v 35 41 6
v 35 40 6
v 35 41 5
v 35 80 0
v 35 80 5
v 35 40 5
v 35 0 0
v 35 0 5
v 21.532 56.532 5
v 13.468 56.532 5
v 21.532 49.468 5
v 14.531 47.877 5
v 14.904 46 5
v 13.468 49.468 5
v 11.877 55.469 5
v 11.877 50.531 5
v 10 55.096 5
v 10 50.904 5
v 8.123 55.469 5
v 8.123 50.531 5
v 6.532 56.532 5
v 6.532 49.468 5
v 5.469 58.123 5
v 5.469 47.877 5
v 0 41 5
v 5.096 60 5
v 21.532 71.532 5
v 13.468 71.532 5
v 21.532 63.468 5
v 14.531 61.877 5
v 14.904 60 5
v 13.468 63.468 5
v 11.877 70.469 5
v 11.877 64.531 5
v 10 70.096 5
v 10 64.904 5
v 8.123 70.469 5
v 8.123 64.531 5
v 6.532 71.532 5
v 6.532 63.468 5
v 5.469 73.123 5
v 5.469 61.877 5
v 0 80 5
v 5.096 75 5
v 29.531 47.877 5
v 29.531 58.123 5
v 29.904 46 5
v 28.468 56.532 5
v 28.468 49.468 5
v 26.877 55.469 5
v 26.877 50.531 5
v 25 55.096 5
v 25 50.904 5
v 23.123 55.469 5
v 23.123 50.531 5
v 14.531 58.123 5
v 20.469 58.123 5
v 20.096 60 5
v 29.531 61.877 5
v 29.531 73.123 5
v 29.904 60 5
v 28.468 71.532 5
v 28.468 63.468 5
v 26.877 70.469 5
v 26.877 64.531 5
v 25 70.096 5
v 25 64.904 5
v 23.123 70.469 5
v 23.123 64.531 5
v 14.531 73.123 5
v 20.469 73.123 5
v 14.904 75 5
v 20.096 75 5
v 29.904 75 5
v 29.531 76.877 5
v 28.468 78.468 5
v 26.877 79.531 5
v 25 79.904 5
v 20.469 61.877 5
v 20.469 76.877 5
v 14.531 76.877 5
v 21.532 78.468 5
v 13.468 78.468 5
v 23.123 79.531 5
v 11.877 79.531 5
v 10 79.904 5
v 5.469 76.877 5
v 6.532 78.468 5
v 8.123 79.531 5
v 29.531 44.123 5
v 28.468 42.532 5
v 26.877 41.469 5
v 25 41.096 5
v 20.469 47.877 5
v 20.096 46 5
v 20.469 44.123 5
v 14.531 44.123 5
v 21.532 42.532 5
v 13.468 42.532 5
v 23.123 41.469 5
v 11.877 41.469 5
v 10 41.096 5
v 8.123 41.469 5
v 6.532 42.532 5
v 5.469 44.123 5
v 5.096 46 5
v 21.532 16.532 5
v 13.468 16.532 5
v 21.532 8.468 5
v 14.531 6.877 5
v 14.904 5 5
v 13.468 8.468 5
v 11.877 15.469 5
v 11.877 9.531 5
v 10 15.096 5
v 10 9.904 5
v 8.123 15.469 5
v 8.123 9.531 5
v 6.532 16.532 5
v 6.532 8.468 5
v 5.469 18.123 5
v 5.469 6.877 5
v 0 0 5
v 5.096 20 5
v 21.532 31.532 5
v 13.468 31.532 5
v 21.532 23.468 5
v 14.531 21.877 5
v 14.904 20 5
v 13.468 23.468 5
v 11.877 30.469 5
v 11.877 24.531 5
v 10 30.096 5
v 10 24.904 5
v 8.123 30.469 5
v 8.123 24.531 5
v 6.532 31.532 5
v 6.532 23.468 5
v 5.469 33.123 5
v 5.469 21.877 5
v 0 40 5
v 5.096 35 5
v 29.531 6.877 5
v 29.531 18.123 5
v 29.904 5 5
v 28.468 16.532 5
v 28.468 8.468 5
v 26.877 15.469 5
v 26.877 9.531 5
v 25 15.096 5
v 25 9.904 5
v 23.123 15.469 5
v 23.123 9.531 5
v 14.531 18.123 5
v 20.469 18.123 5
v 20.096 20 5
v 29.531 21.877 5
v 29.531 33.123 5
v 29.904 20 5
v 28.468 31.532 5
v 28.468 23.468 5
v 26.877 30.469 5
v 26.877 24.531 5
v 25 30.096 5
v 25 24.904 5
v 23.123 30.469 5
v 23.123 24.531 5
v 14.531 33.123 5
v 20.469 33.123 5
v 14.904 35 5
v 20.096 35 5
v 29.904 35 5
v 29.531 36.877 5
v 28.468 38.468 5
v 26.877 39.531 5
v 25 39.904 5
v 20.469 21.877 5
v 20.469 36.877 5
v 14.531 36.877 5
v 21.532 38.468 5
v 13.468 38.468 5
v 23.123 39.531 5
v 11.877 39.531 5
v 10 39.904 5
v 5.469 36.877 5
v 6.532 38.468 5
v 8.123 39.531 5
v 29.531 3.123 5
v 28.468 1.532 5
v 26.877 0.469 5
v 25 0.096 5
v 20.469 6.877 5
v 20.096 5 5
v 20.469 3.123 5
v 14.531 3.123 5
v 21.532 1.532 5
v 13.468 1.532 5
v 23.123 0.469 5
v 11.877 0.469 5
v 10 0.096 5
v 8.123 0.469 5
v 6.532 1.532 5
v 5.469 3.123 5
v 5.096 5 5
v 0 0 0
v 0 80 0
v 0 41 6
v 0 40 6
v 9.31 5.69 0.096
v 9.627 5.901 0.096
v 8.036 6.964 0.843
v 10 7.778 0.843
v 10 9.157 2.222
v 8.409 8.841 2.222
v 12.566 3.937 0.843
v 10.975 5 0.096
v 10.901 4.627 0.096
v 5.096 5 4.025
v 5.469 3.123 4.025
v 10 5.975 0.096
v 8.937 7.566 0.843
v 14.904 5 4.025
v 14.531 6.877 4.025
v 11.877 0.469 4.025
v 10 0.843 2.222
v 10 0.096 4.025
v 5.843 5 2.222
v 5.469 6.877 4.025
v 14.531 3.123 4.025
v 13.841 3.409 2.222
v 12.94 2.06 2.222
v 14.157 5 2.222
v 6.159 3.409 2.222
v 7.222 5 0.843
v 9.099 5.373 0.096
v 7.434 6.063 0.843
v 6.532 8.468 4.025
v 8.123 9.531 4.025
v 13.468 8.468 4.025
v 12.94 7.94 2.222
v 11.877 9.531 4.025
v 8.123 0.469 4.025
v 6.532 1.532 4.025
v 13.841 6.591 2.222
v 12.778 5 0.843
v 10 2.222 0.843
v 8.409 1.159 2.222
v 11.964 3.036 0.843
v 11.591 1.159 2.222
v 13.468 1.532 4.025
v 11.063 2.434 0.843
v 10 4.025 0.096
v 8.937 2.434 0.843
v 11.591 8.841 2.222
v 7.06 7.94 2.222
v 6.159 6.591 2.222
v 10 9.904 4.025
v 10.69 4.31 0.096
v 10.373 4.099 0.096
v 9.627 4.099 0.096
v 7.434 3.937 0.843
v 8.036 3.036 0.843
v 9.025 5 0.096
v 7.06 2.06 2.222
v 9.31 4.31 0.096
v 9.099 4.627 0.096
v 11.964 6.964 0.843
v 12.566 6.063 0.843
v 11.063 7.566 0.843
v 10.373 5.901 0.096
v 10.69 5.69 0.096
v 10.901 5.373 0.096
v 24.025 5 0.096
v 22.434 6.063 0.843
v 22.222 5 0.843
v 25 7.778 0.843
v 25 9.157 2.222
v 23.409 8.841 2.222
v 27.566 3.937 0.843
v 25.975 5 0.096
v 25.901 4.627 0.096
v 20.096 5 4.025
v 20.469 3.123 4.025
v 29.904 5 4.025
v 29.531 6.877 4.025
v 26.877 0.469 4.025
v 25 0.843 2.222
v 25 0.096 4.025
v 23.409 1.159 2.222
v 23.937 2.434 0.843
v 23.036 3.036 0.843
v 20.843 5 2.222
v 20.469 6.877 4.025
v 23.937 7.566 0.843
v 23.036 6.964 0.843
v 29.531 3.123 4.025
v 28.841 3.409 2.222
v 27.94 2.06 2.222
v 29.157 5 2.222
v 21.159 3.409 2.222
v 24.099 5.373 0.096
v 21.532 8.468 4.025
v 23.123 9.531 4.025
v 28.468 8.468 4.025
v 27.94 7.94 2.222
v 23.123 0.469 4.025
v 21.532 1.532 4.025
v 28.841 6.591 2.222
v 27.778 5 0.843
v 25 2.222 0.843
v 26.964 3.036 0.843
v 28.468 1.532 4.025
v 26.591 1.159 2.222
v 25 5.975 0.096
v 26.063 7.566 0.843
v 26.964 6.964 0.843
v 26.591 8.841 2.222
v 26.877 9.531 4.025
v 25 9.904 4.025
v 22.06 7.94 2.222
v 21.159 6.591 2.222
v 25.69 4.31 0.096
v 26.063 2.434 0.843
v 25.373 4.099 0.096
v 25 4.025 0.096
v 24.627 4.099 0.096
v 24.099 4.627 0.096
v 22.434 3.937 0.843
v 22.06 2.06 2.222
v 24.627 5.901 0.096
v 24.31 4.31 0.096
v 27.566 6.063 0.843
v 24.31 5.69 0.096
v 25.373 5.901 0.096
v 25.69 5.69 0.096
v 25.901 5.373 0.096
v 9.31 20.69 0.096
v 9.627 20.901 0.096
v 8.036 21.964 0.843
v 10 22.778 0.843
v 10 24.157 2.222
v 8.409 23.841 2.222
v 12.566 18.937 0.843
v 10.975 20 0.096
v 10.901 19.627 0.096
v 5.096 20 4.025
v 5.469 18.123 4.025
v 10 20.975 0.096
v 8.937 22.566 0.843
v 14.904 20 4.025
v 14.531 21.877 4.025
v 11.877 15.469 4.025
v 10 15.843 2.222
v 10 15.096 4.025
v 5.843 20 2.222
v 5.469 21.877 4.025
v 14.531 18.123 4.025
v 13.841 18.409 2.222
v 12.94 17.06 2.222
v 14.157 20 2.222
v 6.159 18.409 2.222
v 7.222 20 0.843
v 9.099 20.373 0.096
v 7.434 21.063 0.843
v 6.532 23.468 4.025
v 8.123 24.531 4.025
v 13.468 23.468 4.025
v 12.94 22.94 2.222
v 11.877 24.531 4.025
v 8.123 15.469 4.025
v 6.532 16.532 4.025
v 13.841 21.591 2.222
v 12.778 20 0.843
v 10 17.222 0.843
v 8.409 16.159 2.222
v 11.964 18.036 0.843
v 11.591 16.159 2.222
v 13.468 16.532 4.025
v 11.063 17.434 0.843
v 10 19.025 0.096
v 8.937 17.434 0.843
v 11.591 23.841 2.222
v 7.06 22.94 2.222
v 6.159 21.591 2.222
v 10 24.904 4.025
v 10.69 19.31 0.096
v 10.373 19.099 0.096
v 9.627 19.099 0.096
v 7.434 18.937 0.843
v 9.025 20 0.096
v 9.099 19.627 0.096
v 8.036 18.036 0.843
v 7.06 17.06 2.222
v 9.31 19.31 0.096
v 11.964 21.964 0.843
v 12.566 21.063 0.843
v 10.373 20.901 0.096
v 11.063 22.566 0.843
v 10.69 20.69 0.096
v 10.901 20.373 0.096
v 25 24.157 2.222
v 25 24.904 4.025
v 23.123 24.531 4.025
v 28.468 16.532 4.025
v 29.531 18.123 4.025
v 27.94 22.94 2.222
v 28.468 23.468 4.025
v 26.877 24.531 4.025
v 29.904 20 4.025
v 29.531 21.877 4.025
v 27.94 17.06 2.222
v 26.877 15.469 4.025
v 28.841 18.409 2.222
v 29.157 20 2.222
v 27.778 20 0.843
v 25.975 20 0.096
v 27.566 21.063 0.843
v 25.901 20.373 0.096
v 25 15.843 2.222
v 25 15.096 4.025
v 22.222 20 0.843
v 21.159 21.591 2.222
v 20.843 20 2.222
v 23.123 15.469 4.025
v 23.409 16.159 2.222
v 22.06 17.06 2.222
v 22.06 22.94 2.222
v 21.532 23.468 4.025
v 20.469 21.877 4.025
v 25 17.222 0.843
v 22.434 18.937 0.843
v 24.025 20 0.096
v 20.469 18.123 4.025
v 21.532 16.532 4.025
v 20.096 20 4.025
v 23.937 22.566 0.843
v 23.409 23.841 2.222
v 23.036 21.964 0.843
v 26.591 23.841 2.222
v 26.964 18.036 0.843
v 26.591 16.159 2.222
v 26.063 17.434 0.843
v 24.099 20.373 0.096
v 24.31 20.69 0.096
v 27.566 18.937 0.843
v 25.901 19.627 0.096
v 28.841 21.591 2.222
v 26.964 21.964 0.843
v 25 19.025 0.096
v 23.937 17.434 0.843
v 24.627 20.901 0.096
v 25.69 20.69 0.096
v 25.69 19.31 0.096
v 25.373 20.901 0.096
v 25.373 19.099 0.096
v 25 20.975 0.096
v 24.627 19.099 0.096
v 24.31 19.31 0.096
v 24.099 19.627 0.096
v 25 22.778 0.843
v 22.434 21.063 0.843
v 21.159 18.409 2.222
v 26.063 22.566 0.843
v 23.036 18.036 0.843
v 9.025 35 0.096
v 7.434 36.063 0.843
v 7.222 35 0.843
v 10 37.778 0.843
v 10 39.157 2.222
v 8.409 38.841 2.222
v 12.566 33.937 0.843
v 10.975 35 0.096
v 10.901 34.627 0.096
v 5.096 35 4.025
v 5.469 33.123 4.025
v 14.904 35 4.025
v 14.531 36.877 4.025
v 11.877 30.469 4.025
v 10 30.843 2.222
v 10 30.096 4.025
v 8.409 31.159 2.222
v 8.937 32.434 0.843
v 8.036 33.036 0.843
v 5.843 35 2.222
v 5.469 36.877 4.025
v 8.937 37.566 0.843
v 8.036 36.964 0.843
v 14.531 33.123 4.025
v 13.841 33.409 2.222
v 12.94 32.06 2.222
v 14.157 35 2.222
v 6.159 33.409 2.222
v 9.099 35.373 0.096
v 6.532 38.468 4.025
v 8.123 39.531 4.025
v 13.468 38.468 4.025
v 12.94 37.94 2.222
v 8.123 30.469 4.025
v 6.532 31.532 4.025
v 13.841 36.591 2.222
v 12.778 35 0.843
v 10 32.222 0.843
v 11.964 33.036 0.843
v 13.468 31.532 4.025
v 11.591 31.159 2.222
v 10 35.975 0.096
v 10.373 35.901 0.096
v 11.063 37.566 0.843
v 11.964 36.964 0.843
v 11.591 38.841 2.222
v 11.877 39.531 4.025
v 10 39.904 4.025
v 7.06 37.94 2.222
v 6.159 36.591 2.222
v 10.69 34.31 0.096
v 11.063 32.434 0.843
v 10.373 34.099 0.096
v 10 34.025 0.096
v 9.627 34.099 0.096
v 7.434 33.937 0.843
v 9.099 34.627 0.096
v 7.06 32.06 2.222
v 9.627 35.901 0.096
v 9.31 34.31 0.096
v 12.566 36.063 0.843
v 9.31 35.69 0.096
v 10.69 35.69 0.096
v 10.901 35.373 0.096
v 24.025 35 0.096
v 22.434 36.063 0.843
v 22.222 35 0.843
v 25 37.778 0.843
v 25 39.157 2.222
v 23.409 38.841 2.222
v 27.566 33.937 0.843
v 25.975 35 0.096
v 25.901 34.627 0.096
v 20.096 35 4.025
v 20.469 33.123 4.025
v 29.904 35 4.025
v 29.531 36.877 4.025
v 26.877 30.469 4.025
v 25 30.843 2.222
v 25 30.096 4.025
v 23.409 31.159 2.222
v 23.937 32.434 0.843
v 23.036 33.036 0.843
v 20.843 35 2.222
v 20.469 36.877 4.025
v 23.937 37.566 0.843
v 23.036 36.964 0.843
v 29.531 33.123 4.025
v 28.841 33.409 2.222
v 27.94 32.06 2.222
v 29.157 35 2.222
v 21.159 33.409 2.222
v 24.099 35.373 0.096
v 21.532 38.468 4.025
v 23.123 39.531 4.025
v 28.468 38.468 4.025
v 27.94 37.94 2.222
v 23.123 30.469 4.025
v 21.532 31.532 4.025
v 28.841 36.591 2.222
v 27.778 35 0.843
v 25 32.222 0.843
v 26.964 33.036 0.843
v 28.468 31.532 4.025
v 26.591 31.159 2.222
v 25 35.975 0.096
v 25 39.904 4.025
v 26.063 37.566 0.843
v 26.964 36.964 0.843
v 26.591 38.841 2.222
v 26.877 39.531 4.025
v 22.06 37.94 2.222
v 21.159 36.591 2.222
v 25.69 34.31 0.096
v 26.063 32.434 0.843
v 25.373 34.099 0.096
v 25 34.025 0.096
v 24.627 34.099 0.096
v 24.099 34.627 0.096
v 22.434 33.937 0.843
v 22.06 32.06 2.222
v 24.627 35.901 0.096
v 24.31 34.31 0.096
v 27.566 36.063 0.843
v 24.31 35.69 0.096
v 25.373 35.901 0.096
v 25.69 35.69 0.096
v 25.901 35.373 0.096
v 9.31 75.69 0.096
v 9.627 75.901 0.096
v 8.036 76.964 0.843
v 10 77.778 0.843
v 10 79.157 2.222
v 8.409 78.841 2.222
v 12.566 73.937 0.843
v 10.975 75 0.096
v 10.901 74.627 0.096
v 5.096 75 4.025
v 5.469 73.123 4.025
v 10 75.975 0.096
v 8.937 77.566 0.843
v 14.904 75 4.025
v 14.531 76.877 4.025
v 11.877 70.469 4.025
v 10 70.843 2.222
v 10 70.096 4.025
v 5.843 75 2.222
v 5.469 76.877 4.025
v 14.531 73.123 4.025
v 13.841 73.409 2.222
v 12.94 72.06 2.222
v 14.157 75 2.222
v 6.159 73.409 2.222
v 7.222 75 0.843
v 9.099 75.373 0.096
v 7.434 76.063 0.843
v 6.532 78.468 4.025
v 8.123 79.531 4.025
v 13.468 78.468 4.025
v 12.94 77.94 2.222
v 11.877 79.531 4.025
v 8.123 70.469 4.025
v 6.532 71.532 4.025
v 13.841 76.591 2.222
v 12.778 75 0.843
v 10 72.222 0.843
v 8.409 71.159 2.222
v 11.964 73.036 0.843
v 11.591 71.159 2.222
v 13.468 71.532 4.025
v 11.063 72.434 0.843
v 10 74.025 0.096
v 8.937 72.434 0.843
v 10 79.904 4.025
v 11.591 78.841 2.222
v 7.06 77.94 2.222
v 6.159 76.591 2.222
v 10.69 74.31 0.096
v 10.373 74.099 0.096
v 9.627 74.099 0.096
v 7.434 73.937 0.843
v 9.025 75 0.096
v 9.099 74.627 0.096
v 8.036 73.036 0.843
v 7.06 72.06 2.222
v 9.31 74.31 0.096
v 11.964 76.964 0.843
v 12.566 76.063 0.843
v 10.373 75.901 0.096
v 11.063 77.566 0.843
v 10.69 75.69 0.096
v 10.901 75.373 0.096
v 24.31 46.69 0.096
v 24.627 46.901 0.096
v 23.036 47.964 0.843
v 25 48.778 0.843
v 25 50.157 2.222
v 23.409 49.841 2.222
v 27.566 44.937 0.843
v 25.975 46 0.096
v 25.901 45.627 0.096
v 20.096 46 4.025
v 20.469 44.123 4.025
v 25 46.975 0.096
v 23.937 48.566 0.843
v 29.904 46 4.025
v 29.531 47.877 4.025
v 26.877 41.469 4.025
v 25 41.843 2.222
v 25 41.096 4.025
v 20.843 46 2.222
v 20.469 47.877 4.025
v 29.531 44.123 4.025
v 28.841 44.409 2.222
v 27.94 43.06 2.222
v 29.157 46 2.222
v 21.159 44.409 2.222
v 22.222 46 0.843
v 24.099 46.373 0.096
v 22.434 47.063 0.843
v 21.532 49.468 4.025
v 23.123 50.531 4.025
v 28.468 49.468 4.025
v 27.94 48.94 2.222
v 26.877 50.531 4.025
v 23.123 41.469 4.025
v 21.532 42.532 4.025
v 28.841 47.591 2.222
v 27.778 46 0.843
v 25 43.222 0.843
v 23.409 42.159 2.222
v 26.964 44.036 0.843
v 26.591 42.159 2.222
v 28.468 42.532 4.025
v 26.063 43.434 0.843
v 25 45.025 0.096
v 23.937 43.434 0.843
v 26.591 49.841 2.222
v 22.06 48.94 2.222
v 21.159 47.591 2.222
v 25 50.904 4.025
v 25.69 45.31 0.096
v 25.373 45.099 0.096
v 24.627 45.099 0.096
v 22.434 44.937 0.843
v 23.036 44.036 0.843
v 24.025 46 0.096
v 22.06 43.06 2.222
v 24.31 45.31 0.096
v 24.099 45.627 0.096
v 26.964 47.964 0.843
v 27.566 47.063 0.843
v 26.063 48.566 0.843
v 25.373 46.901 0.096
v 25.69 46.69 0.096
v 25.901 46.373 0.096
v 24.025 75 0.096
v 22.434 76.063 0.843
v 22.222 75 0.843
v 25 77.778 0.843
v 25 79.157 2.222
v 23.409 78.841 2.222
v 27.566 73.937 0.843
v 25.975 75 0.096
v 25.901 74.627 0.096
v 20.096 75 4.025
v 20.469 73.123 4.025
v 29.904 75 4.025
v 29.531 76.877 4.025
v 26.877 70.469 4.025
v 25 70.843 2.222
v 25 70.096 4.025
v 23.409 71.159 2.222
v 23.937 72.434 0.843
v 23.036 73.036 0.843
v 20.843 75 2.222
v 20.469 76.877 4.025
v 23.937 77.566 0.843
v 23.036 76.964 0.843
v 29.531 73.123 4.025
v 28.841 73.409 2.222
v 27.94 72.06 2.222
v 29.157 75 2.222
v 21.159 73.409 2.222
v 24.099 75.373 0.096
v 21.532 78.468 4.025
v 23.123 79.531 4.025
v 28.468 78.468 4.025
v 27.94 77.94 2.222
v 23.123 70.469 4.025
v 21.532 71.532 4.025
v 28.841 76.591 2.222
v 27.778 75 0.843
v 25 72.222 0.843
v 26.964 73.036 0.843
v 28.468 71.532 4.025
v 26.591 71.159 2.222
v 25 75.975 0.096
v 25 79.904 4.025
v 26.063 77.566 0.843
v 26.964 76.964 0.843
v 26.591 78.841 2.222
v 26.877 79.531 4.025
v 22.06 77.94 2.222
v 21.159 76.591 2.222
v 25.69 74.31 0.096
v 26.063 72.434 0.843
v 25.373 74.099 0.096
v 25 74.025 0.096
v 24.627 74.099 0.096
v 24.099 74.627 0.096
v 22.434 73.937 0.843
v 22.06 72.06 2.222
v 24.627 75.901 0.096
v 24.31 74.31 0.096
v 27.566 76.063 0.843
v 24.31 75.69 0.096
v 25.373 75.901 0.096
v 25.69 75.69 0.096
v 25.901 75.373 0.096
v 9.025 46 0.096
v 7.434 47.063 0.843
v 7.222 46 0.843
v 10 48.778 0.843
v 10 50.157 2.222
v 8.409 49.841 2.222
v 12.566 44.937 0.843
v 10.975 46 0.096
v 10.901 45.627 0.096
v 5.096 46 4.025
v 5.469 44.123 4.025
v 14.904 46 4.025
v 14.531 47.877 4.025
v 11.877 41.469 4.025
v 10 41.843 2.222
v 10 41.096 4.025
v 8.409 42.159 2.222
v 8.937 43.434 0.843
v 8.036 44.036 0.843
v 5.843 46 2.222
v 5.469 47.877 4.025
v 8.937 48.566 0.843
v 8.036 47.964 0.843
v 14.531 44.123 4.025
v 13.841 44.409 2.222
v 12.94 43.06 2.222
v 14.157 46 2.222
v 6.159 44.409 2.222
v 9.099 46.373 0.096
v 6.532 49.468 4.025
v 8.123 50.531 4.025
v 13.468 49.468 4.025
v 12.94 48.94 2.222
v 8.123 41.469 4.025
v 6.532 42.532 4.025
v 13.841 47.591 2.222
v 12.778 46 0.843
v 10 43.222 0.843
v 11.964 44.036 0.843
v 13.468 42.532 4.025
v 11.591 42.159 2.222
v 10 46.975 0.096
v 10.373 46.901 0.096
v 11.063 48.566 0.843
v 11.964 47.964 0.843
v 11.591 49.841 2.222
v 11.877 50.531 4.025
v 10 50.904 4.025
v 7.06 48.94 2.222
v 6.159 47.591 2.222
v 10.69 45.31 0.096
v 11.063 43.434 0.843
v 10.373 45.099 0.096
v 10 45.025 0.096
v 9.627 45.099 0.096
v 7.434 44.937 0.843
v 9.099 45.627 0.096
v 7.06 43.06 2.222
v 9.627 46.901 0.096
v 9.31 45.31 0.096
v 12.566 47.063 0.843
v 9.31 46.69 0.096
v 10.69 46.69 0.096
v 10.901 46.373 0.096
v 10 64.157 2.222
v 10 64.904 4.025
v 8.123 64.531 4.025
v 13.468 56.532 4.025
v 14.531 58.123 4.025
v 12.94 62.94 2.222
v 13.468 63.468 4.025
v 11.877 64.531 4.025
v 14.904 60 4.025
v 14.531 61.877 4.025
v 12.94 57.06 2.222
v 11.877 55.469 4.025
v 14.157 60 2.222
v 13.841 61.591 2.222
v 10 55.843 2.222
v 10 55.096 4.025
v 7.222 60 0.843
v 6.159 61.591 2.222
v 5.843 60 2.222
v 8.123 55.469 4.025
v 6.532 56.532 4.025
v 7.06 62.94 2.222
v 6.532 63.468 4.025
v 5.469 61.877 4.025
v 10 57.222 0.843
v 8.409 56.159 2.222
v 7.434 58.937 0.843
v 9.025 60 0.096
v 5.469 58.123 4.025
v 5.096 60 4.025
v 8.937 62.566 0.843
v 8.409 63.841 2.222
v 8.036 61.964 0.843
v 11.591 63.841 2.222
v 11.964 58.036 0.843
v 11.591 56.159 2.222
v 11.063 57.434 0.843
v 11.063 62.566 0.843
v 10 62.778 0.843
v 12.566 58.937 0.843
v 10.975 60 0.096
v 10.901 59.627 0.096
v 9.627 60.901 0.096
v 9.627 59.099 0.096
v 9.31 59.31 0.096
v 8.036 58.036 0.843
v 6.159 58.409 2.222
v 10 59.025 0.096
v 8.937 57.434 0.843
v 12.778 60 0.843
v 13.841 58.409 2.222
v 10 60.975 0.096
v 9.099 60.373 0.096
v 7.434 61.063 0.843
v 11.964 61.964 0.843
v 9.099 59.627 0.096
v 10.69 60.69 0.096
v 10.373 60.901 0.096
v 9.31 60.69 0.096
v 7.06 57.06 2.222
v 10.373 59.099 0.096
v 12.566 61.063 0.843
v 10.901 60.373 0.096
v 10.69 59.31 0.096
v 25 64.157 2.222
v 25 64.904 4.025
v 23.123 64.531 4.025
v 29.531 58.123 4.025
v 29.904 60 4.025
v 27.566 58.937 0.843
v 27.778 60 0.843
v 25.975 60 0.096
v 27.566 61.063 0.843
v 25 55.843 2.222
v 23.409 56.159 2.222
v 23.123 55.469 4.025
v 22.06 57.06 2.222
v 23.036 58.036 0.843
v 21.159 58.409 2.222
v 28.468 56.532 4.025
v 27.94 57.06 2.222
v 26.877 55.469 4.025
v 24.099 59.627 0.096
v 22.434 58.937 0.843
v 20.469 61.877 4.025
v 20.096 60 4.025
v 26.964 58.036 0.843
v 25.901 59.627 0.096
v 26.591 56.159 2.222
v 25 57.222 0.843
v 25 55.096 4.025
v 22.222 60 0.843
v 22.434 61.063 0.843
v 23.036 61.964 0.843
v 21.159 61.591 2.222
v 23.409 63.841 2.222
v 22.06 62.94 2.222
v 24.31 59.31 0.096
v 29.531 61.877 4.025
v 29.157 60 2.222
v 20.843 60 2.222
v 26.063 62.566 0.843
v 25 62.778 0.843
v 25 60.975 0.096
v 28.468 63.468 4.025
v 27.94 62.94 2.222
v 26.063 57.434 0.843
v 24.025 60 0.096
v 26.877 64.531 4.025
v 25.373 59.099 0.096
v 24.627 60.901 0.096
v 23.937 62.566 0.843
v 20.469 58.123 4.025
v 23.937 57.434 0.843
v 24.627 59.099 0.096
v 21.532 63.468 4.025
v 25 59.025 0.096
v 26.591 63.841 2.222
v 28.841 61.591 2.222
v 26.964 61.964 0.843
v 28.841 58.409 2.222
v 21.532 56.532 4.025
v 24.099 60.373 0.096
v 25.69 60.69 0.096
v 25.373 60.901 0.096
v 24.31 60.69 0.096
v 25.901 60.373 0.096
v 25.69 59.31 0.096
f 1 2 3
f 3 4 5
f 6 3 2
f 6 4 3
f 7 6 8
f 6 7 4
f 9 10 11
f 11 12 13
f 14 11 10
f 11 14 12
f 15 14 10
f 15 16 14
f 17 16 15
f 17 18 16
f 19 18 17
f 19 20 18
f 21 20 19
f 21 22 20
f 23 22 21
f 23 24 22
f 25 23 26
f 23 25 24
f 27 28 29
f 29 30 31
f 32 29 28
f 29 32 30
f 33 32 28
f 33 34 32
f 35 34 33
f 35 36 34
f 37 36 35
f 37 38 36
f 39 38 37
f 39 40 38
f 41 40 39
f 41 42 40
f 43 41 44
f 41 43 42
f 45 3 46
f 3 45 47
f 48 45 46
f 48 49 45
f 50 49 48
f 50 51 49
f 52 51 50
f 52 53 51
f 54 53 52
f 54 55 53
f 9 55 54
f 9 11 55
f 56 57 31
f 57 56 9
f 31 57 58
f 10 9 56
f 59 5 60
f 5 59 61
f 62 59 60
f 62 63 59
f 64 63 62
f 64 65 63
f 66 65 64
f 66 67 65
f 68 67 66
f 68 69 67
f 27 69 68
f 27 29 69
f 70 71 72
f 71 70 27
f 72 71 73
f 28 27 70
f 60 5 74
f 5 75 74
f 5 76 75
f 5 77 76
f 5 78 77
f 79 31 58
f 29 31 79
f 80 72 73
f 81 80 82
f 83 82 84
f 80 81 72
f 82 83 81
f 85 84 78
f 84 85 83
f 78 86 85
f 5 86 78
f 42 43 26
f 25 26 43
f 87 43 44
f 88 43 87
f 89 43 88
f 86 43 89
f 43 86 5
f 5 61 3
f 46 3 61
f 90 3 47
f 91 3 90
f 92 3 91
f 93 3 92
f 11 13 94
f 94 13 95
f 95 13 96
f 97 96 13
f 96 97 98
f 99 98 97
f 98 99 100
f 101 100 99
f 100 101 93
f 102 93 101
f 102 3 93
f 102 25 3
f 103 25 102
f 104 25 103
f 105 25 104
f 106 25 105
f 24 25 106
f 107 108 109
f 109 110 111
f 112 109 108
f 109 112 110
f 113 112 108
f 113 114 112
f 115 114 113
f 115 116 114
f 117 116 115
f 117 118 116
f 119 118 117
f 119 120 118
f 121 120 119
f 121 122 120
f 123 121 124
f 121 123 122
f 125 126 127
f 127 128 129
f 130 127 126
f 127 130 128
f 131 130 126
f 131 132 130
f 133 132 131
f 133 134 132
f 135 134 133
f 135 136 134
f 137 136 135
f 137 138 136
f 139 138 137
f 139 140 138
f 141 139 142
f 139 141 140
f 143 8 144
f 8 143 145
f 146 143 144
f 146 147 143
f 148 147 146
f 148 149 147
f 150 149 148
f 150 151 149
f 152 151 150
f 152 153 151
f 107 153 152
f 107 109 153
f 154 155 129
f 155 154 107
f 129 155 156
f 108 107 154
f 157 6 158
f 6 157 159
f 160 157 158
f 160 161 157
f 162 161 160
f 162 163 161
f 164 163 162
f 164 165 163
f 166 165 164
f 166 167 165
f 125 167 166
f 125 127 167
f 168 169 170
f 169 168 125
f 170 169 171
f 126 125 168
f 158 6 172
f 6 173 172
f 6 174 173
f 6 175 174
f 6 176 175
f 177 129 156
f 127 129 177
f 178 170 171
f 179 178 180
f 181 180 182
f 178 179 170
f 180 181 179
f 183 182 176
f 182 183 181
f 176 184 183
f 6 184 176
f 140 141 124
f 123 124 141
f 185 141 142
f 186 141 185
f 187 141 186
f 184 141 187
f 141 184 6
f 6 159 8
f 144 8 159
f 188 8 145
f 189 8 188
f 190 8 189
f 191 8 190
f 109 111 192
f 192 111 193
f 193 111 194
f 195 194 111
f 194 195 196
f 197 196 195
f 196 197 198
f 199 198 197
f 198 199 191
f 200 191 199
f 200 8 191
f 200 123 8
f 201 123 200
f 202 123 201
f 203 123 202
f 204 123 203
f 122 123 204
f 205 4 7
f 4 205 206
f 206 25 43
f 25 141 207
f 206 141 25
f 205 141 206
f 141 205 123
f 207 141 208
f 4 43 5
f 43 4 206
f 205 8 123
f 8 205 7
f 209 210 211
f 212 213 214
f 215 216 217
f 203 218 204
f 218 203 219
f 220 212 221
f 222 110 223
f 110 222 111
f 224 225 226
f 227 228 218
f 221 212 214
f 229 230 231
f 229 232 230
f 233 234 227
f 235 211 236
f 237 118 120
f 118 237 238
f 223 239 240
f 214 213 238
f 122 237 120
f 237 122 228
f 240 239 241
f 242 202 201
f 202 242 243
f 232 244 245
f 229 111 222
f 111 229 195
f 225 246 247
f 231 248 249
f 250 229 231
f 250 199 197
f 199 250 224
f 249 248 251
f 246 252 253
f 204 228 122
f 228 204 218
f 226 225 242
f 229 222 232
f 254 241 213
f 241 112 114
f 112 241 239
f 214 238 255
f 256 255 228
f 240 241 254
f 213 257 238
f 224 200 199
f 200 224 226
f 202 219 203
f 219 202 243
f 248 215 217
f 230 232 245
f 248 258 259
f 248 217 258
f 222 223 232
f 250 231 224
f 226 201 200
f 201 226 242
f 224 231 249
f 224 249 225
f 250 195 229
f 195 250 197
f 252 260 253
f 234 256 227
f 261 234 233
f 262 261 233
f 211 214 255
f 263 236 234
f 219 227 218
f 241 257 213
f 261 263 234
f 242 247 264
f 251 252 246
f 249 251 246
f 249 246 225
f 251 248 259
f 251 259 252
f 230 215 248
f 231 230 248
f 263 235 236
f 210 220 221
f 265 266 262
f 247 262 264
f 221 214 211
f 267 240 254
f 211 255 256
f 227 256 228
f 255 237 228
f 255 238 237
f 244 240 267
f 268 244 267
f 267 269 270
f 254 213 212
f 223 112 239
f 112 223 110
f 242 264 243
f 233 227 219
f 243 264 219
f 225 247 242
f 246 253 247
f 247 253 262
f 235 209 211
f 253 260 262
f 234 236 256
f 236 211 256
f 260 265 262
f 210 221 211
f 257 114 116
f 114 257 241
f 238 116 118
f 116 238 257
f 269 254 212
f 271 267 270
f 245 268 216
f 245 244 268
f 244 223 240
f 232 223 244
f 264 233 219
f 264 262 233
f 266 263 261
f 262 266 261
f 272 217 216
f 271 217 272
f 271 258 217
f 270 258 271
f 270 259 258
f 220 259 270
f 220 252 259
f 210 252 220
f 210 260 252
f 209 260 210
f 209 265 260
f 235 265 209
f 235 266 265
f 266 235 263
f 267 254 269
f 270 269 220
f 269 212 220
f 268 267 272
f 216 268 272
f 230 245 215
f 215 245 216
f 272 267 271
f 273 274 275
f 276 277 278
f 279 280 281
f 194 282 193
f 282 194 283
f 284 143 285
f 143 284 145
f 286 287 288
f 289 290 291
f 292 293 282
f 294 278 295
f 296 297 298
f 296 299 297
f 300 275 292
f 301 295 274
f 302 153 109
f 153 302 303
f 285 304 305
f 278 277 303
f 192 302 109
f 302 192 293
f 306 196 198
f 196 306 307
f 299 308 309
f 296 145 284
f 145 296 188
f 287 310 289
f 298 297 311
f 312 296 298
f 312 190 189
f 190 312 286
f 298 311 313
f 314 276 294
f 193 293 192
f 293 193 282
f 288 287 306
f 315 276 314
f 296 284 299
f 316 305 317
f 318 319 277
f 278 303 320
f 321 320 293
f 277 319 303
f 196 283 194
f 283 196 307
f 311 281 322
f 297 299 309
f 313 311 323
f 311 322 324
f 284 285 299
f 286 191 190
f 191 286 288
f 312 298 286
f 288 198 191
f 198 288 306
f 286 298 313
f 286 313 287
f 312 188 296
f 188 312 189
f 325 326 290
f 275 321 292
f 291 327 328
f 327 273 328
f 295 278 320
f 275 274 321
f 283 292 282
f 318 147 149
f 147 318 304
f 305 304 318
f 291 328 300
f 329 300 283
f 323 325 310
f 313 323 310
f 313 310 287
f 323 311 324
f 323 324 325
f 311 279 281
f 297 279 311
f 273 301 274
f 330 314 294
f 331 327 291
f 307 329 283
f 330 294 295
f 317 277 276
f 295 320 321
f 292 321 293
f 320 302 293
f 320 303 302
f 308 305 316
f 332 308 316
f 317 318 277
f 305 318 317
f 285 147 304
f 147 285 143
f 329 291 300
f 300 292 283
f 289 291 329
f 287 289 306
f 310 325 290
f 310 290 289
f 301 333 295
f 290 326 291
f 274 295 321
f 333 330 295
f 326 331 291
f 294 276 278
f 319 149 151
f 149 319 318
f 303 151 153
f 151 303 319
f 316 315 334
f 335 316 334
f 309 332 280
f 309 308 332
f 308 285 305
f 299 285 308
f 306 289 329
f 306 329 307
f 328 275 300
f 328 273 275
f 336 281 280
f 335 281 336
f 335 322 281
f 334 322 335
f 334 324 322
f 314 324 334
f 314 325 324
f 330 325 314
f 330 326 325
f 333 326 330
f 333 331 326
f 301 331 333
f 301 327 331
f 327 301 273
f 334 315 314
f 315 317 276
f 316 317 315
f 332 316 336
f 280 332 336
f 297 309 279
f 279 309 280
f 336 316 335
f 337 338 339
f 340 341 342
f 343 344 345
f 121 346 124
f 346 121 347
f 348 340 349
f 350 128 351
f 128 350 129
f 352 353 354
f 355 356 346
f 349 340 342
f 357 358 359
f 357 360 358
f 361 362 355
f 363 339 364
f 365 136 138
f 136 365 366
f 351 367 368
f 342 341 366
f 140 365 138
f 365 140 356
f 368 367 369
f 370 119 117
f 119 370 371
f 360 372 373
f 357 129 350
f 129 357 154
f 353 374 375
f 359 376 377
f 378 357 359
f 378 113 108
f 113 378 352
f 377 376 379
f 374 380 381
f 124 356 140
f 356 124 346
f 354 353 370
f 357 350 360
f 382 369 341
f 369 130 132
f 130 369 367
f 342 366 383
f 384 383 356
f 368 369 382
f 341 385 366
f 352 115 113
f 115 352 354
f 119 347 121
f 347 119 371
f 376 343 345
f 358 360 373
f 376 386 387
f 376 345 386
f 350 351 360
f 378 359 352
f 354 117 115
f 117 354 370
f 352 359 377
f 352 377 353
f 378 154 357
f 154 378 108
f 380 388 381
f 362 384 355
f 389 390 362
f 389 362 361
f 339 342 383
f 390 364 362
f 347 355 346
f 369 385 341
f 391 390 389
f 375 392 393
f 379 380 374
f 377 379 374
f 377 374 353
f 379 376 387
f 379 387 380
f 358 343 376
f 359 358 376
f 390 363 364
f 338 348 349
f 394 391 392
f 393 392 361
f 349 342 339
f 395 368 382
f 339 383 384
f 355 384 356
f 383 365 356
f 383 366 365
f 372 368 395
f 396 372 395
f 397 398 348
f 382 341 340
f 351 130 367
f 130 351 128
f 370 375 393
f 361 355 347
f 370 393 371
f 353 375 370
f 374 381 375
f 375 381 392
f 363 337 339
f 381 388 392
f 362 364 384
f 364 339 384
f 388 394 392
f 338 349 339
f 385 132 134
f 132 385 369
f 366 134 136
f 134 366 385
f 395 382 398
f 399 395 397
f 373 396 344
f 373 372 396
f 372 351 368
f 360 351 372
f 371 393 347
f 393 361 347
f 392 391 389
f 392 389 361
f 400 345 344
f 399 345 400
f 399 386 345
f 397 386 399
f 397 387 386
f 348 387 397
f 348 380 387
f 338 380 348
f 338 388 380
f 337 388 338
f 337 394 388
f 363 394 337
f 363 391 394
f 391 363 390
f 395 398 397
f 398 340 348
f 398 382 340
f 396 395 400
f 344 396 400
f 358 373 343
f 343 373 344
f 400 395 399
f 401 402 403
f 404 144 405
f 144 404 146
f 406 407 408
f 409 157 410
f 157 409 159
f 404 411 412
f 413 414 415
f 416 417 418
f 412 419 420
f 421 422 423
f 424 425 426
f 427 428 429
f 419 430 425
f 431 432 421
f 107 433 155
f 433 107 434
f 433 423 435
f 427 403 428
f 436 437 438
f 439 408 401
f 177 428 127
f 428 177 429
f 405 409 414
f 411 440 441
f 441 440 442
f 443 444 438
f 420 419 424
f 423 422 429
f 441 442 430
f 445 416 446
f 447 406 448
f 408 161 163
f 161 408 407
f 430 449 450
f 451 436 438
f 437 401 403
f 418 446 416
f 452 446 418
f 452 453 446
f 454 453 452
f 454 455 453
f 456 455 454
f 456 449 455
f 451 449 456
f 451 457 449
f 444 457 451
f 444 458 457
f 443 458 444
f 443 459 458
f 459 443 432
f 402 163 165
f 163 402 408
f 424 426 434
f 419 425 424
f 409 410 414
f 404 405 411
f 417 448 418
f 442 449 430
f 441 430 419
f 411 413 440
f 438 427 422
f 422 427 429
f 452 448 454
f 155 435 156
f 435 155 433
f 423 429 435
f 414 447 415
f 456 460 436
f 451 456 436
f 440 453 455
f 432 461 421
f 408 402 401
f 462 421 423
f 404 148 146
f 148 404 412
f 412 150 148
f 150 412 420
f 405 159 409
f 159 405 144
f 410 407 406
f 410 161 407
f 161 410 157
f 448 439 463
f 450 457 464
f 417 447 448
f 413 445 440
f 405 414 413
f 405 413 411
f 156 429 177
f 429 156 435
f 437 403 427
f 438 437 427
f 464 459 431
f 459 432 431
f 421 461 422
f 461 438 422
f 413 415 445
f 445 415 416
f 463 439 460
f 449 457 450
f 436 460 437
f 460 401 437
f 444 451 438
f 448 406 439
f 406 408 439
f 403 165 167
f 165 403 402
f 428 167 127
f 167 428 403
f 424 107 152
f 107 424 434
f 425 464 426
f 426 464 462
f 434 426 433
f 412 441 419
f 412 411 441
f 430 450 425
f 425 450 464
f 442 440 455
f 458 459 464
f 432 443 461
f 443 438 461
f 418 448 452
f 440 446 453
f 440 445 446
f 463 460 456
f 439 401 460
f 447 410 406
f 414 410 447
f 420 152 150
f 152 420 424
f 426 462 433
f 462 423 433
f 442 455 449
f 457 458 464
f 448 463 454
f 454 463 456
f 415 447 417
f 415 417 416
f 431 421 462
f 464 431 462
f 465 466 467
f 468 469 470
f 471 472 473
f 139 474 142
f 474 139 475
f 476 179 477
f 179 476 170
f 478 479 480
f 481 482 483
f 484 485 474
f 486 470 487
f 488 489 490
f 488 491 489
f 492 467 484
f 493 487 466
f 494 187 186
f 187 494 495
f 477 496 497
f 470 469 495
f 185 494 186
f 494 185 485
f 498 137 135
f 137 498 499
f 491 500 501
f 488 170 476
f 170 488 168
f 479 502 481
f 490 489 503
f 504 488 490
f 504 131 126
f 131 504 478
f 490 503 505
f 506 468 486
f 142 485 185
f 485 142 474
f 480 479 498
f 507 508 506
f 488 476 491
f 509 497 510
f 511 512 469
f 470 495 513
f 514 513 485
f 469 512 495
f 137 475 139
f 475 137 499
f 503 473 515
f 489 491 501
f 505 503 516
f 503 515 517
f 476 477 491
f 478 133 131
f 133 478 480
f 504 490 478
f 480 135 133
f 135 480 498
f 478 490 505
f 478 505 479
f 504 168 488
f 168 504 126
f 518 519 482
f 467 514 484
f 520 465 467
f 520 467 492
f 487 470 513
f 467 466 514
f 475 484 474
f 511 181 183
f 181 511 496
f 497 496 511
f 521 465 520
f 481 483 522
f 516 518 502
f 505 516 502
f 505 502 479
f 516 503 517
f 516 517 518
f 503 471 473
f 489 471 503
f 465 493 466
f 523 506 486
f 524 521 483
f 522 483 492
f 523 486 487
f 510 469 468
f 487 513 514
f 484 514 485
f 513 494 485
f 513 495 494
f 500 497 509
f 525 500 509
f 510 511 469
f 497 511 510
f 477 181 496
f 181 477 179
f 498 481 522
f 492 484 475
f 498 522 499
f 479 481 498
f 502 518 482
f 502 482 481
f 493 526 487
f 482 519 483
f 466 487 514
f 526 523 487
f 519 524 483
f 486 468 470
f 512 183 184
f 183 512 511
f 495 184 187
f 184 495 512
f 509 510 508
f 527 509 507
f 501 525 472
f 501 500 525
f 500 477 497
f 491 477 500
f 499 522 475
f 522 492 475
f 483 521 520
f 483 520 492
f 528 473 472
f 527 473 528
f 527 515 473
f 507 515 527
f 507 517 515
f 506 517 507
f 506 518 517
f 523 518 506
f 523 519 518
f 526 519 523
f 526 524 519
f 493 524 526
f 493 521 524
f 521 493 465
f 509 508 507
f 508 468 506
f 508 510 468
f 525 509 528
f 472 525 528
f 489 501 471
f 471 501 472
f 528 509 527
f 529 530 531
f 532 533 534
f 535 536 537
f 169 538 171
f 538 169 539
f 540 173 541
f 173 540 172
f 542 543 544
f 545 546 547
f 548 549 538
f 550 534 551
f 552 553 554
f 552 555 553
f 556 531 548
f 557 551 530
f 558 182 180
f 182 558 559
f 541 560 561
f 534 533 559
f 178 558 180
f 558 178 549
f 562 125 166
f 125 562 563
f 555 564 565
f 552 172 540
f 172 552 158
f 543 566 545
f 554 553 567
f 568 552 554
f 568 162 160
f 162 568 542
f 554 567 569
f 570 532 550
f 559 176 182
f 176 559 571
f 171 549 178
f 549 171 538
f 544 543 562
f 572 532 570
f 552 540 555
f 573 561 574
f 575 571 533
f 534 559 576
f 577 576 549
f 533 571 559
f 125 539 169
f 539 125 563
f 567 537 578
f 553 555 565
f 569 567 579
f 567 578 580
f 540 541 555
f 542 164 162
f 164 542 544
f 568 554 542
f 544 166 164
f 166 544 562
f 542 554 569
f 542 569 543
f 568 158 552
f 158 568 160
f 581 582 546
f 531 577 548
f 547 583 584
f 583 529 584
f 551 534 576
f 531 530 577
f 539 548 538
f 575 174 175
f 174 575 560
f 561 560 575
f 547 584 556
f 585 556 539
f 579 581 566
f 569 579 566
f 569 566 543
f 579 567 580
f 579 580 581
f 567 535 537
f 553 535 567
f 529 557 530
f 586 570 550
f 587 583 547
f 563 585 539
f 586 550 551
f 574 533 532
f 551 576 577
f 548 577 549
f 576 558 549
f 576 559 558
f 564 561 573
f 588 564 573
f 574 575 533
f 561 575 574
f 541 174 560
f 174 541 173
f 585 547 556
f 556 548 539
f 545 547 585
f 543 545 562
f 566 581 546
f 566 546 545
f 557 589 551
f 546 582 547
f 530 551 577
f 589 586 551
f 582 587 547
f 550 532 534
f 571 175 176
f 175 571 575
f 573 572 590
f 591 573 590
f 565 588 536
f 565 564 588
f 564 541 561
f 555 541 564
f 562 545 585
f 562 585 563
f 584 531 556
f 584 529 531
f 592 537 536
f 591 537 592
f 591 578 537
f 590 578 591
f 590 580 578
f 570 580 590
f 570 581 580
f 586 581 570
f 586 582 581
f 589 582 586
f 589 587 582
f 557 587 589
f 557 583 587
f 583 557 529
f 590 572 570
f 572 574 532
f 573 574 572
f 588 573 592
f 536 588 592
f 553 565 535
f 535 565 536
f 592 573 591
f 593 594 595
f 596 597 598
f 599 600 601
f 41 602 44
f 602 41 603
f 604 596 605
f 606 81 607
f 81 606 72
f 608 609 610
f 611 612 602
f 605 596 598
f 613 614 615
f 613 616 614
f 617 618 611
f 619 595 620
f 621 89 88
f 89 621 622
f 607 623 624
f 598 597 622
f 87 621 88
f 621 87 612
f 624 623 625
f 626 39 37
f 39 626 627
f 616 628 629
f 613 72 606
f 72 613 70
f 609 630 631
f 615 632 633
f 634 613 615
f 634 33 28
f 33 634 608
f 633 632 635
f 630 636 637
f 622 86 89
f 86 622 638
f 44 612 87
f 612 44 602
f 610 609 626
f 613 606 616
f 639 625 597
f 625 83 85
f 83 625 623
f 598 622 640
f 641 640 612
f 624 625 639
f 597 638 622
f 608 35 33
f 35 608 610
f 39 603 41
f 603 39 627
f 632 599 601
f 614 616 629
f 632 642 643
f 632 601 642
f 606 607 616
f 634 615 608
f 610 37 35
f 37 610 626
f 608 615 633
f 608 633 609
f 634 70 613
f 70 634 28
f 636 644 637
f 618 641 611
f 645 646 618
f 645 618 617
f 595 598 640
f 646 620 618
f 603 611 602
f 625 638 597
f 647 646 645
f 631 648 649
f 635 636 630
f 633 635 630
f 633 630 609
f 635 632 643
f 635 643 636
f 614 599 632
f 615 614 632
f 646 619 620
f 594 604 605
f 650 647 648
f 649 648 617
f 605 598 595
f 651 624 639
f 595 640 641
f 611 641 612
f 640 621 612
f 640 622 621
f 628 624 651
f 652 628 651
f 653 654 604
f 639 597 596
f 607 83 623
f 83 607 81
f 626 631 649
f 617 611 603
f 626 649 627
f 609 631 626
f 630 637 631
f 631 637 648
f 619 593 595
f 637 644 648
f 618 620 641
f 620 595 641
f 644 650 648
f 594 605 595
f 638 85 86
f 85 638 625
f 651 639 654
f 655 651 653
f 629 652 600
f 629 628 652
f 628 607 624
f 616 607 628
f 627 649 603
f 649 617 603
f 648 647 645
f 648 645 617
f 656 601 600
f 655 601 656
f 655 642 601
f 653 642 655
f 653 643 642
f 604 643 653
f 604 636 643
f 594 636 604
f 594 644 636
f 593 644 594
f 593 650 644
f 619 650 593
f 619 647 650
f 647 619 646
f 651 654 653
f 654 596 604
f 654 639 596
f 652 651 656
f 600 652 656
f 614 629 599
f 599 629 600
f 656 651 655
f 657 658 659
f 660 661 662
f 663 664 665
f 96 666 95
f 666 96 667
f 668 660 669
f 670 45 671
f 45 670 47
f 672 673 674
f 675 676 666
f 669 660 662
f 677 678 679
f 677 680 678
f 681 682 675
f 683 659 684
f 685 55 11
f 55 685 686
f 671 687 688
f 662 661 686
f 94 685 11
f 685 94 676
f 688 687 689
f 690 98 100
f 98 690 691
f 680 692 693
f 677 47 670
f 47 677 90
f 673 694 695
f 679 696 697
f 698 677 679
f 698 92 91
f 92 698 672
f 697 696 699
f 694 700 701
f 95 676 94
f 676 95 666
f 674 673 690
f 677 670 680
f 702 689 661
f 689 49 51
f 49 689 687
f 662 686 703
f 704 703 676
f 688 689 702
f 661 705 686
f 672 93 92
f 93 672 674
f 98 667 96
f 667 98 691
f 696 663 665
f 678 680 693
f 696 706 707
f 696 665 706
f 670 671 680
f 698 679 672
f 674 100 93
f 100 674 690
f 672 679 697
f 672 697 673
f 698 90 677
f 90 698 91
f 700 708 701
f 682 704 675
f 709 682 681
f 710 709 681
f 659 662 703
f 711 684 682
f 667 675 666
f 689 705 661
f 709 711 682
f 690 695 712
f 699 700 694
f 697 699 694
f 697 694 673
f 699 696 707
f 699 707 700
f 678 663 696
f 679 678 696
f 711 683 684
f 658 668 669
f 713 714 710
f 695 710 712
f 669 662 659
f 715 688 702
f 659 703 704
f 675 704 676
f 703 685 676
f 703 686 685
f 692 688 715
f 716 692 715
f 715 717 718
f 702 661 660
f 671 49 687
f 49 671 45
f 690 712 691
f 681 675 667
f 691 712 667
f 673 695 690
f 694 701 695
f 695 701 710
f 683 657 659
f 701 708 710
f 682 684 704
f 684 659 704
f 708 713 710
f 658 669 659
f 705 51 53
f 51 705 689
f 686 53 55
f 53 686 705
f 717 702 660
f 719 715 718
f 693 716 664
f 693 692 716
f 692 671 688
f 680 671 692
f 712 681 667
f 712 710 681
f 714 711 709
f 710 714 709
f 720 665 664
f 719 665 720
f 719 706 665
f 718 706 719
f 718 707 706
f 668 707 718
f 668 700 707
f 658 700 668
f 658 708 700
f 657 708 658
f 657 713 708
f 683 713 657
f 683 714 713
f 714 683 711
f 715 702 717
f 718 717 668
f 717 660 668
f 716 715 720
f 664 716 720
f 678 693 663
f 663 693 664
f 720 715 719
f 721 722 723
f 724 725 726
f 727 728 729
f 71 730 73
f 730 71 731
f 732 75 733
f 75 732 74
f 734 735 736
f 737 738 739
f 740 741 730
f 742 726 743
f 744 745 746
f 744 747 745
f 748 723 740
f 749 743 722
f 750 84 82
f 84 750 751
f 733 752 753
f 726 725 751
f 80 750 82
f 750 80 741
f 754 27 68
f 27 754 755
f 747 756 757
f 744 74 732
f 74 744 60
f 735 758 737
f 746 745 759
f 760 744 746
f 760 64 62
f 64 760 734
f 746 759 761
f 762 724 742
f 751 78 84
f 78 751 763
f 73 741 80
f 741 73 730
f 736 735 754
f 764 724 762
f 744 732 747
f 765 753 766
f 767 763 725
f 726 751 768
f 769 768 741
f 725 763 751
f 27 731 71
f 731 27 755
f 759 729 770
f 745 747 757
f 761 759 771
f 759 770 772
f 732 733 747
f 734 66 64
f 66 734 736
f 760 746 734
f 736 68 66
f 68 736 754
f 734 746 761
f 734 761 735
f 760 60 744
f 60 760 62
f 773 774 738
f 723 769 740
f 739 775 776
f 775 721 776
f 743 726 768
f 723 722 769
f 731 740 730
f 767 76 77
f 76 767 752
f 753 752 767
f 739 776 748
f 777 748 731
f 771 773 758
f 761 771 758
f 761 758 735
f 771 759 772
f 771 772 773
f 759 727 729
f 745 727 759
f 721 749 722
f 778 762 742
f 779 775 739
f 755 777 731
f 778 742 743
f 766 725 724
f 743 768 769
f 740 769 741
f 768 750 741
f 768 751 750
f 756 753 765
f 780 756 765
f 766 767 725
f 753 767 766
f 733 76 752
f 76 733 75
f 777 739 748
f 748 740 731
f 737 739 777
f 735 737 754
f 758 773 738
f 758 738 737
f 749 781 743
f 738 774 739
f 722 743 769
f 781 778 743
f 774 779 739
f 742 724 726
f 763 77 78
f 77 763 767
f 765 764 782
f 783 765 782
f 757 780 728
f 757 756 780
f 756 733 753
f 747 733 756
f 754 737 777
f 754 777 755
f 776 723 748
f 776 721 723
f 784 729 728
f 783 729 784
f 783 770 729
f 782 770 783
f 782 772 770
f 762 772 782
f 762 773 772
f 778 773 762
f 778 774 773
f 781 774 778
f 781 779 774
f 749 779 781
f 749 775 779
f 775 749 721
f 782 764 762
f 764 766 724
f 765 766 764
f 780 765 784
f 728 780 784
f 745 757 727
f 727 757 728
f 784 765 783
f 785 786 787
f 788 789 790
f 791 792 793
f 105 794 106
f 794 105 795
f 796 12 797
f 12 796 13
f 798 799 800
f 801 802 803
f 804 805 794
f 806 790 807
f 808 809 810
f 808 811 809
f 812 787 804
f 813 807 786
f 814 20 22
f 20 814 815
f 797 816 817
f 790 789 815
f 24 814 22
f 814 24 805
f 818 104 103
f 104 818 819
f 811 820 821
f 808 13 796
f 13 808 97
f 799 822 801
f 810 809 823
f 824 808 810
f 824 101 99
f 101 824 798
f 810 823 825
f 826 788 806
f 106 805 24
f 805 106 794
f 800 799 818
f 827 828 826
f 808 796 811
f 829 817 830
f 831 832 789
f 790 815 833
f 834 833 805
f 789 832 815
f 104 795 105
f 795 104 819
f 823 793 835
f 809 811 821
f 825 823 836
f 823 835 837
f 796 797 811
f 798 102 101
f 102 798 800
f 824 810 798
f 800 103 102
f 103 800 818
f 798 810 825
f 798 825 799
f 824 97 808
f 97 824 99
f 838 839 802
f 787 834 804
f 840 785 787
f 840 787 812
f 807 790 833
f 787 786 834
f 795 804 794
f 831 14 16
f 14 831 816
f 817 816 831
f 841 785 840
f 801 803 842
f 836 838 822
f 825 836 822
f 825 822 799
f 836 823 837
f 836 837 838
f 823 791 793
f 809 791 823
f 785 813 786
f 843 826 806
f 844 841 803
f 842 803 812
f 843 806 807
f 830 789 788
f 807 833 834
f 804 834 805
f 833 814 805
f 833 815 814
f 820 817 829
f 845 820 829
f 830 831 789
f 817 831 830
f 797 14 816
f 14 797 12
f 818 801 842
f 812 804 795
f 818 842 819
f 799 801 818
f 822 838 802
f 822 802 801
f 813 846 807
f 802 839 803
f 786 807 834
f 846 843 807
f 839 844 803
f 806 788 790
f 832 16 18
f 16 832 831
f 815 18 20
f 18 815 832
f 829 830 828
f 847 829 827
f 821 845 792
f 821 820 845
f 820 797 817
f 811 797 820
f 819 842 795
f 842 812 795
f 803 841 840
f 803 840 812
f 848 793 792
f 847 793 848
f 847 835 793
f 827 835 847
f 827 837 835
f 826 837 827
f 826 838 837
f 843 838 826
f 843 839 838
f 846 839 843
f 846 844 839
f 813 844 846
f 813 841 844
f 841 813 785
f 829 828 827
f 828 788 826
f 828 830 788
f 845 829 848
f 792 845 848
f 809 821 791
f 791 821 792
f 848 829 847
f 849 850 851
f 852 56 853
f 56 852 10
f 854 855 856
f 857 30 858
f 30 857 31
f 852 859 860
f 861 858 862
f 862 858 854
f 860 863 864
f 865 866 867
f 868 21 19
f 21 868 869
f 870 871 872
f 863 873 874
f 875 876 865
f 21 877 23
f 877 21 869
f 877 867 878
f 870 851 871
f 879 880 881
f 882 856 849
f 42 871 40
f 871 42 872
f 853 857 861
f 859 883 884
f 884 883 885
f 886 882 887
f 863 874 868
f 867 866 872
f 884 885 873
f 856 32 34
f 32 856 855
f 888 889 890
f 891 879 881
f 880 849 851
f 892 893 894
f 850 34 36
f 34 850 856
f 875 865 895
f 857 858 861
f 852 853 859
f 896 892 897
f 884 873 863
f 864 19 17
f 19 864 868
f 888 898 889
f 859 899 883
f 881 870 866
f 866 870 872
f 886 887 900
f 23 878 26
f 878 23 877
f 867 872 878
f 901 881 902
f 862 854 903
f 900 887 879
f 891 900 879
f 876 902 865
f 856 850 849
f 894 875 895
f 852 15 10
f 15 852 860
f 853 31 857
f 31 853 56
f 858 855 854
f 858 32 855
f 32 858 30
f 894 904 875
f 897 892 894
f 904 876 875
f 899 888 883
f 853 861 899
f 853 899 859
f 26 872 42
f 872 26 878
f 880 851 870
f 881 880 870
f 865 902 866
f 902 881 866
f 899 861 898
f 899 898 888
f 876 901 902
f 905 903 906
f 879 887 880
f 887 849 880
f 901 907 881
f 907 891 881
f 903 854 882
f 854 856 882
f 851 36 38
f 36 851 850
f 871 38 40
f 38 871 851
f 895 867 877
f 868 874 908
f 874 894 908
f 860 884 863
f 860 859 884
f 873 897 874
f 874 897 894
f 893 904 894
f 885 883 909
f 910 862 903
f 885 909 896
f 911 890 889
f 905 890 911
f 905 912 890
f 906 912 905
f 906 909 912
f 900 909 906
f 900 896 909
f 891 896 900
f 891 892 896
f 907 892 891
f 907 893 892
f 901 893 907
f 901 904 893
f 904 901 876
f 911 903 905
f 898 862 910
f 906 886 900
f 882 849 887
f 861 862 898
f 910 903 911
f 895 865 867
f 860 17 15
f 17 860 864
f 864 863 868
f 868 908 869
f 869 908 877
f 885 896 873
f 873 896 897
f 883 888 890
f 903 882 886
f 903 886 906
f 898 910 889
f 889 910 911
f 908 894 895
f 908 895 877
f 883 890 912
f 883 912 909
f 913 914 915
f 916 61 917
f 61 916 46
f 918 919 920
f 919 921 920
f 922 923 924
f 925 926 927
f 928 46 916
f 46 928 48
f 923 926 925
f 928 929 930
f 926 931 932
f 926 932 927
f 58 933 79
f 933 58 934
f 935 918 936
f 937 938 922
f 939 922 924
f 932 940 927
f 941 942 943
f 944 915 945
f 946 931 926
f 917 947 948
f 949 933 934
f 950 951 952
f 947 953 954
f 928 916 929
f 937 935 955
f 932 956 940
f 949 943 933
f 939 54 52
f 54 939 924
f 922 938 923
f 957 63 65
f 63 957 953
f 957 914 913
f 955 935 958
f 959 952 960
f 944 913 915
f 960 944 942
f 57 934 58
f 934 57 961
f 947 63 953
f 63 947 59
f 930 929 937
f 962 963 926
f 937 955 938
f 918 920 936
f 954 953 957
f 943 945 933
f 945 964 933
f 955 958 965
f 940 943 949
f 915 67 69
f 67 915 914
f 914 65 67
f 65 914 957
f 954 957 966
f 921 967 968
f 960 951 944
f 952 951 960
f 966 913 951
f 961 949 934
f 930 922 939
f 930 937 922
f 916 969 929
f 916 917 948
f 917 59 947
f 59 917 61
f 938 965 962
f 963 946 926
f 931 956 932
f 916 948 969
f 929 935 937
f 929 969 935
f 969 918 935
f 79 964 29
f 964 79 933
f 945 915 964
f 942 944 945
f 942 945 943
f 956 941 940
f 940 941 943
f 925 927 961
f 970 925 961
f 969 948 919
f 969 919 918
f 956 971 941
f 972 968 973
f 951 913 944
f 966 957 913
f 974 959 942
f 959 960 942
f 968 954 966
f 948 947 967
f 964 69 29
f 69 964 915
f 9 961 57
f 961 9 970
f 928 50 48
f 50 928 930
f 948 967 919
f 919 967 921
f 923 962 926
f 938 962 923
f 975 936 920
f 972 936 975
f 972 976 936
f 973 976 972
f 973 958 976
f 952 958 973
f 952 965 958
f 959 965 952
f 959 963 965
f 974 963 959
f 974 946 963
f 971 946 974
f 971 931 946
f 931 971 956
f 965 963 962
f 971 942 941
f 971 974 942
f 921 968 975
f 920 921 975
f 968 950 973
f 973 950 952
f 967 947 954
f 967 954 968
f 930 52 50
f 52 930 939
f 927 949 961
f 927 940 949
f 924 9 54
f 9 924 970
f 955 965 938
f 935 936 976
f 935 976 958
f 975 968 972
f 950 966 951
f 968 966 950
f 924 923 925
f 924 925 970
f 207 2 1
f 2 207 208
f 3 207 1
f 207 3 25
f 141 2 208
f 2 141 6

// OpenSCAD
// Loguncov Maxim 13.12.13


//$fn=128;


translate([0,40,0])cube([35,1,6]);

difference() {

//основа
cube([35,80,5]);

//отверстия
translate([10,5,5])sphere(5);
translate([25,5,5])sphere(5);
translate([10,20,5])sphere(5);
translate([25,20,5])sphere(5);
translate([10,35,5])sphere(5);
translate([25,35,5])sphere(5);

translate([10,75,5])sphere(5);
translate([25,46,5])sphere(5);
translate([25,75,5])sphere(5);
translate([10,46,5])sphere(5);
translate([10,60,5])sphere(5);
translate([25,60,5])sphere(5);
}
